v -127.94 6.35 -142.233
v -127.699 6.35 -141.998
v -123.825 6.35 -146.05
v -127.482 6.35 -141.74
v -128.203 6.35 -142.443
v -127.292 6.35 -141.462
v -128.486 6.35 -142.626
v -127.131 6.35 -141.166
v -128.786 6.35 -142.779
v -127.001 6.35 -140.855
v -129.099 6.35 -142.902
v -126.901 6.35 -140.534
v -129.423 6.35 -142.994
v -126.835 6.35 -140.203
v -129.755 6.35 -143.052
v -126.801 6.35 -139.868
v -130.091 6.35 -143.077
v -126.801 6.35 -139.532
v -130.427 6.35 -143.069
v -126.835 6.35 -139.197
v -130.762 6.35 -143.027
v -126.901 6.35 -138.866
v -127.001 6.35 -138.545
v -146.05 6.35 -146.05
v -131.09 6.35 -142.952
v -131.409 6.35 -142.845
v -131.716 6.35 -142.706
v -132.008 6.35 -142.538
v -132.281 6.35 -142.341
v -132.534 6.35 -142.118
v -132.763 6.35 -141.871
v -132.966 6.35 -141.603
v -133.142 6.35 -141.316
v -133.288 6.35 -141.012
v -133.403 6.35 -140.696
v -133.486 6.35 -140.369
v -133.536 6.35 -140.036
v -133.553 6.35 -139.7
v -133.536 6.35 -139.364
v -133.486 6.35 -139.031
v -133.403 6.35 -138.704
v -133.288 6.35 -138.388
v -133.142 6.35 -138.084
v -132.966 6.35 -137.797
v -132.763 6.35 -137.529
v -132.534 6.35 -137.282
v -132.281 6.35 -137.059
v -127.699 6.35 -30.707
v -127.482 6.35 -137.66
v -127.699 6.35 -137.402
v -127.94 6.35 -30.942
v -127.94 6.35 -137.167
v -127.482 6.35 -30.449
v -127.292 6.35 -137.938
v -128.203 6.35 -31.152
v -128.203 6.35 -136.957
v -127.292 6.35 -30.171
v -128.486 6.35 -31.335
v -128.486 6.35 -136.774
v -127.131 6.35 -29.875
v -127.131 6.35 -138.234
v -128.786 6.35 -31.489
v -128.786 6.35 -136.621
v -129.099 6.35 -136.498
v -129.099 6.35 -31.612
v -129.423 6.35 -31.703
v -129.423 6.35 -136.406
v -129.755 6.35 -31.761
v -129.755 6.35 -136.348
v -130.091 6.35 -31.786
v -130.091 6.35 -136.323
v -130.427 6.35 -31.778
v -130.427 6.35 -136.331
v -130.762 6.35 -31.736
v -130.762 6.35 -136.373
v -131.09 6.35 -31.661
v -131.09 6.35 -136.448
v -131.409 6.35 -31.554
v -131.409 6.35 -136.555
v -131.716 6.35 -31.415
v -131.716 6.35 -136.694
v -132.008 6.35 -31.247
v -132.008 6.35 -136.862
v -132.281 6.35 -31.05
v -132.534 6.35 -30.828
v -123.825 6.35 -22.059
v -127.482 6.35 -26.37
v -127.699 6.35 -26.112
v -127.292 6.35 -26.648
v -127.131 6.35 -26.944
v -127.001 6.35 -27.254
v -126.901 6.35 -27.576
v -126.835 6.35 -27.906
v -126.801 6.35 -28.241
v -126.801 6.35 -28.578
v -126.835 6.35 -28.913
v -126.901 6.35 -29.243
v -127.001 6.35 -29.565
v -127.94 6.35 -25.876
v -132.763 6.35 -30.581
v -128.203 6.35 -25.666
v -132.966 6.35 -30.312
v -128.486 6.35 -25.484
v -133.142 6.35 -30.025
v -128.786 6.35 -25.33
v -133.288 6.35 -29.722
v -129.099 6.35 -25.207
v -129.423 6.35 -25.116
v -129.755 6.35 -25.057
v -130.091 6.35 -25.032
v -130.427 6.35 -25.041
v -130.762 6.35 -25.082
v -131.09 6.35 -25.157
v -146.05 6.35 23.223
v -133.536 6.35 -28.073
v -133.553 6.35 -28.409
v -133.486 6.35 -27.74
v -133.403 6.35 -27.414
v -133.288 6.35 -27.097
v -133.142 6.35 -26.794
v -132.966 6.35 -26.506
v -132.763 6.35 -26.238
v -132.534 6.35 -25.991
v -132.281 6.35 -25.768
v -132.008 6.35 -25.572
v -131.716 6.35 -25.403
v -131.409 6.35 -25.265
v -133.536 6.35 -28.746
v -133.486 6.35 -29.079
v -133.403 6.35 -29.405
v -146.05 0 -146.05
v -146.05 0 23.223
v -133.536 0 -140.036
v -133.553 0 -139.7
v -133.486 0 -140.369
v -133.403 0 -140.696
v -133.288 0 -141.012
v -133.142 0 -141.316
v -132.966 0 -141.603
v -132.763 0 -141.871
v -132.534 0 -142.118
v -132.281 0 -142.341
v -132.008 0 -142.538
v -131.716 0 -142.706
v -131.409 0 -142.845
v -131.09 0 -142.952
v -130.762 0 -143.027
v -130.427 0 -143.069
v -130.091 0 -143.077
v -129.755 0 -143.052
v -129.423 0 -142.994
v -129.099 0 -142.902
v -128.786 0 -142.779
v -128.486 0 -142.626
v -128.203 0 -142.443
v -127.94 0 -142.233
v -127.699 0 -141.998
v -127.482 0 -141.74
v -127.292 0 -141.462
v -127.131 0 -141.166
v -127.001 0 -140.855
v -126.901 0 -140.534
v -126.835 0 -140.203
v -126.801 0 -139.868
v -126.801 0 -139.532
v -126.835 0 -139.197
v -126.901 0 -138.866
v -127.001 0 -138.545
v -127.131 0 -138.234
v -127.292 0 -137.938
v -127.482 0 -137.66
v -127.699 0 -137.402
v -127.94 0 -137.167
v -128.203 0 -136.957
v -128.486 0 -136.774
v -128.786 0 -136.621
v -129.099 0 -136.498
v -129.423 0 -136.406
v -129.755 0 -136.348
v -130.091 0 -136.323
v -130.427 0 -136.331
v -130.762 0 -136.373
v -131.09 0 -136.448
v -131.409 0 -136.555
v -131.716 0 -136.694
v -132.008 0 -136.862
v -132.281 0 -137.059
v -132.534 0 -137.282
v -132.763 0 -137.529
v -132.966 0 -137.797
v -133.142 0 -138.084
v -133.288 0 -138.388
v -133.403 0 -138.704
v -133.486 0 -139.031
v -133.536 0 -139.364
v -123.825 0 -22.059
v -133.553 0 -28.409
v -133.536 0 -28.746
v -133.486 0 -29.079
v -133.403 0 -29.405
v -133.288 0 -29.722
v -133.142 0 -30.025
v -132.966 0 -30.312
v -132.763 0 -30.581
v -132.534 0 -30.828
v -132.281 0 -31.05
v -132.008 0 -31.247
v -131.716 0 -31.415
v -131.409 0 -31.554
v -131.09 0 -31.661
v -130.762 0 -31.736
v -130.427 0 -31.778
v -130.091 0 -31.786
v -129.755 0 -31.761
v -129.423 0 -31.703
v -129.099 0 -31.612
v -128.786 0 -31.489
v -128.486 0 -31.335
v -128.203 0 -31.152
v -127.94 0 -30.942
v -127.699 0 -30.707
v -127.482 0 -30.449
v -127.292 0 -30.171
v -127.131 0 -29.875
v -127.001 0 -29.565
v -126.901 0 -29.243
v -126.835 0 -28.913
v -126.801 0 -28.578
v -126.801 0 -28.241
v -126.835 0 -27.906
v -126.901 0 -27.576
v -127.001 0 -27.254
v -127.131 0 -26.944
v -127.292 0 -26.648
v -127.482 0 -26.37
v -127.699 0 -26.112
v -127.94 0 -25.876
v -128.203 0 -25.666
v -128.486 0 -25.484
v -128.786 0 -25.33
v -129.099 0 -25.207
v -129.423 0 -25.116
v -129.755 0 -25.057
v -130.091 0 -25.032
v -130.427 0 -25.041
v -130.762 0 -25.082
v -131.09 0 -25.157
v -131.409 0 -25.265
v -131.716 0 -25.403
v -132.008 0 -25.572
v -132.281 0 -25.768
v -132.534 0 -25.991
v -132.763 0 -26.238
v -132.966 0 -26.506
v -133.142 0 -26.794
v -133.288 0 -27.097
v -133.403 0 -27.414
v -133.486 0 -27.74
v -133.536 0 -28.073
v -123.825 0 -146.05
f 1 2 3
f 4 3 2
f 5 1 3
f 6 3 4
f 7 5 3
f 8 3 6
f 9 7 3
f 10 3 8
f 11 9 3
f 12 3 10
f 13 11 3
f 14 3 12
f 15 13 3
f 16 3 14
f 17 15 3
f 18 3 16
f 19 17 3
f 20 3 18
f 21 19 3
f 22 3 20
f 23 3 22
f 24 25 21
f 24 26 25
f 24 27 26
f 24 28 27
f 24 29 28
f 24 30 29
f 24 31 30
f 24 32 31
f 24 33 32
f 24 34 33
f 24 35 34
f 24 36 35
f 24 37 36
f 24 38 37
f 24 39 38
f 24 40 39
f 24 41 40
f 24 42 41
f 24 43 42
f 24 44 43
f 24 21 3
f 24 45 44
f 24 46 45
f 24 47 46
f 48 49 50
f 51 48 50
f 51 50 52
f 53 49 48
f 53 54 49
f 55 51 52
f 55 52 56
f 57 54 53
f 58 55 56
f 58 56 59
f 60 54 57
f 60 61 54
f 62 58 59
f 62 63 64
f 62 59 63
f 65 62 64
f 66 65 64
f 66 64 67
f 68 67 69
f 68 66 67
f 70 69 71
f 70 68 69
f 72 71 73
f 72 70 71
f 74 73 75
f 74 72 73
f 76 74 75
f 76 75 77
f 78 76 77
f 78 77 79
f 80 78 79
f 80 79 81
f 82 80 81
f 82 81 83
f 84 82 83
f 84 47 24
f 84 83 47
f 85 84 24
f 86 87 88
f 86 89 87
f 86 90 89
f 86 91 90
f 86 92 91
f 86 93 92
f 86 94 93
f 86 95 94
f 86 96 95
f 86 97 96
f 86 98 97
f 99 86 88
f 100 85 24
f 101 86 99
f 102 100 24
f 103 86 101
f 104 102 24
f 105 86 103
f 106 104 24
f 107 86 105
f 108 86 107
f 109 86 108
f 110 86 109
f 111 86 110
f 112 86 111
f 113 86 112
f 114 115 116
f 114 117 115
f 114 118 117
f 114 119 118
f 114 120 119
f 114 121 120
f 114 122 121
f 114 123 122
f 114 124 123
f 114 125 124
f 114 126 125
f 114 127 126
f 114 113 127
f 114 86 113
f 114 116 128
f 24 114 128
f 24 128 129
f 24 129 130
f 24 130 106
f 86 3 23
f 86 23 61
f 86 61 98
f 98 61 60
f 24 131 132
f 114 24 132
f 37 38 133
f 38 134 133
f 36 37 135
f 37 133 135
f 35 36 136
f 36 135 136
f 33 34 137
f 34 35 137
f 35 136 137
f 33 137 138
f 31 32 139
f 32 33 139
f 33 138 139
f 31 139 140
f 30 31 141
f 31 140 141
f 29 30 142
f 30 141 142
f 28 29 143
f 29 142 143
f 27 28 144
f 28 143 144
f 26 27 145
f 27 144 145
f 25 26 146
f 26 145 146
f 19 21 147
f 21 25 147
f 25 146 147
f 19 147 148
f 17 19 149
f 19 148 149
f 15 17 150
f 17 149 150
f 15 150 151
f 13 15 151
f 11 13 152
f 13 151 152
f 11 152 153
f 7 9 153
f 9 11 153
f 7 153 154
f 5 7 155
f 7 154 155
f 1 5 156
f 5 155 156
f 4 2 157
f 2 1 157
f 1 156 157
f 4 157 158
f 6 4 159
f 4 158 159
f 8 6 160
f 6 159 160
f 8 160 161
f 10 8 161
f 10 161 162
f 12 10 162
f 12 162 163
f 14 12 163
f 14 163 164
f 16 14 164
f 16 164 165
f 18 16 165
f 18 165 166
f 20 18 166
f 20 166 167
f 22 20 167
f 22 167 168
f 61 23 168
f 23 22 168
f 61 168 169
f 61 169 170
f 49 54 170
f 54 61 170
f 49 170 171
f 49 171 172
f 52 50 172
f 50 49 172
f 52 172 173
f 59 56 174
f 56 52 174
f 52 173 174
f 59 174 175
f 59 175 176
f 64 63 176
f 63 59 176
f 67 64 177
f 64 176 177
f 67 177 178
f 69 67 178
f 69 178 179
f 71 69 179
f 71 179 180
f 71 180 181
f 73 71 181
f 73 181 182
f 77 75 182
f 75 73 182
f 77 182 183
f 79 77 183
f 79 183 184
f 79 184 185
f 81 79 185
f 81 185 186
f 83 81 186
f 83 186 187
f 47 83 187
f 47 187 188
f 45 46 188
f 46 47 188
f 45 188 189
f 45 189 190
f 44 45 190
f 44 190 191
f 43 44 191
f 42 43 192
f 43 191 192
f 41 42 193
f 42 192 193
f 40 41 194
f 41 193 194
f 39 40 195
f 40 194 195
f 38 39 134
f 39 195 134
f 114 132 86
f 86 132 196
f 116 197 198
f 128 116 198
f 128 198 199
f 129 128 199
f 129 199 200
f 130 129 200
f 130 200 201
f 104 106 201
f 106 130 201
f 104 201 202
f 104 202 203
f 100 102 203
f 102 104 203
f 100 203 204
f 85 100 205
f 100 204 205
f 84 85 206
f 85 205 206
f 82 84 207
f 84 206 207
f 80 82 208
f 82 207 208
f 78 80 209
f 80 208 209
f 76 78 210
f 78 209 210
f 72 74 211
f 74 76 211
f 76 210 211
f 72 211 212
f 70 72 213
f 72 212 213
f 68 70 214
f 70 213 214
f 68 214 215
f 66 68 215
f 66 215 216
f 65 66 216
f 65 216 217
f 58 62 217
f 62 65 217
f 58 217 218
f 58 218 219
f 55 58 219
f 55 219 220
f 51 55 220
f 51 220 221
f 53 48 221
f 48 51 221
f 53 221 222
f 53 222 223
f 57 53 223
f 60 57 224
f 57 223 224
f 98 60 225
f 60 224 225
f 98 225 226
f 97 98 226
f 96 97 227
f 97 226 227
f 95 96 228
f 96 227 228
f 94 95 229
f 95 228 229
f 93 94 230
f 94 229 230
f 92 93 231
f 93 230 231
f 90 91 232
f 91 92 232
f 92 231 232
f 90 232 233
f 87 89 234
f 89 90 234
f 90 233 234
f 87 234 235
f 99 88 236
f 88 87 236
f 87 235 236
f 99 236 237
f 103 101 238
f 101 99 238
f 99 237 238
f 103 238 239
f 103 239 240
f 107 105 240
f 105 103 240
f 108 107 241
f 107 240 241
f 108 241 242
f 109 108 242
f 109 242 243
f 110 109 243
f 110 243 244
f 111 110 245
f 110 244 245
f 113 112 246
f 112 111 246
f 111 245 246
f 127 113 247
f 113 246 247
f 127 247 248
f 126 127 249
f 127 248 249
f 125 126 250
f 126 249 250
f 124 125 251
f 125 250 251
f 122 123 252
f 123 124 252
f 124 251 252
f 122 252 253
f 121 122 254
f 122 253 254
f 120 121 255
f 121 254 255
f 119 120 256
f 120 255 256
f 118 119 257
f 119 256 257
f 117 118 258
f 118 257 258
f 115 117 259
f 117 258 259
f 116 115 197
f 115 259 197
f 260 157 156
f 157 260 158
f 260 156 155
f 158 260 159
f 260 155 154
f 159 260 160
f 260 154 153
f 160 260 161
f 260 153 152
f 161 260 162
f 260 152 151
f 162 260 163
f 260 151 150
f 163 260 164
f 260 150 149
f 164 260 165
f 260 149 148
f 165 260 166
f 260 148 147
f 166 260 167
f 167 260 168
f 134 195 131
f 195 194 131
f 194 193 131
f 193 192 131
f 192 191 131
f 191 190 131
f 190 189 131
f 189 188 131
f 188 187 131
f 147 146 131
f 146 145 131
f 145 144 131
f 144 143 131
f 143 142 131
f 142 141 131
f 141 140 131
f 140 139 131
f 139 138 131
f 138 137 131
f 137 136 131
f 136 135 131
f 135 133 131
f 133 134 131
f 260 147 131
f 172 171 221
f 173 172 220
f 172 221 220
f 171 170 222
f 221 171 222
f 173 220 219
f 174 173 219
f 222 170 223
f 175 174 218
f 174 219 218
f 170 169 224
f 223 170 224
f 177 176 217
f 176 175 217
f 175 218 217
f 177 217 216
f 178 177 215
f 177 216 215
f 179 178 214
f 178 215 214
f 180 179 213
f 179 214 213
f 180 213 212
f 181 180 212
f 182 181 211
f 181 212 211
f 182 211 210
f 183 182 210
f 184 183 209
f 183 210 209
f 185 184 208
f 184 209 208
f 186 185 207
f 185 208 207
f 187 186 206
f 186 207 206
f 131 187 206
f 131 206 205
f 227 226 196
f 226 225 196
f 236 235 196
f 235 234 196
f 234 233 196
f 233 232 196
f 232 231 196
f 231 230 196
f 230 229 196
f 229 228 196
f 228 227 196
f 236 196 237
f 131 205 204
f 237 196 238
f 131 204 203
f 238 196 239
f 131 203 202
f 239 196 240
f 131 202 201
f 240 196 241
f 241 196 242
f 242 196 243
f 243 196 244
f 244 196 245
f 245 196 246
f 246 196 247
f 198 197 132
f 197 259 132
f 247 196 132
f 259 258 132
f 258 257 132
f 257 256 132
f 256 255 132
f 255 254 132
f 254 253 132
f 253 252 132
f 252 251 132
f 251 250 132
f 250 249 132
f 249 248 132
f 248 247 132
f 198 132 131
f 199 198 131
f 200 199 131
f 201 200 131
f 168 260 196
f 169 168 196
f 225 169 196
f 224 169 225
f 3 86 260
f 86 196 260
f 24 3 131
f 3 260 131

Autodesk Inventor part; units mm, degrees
ref_plane "YZ Plane" through (0, 0, 0) normal (1, 0, 0) x (0, 1, 0)
ref_plane "XZ Plane" through (0, 0, 0) normal (0, 1, 0) x (-1, 0, 0)
ref_plane "XY Plane" through (0, 0, 0) normal (0, 0, 1) x (1, 0, 0)
sketch "Sketch1" plane through (0, 0, 0) normal (0, 1, 0) x (-1, 0, 0)
  circle A0 centre (130.175, -139.7) radius 3.3782
  circle A1 centre (130.175, -28.4093) radius 3.3782
  line L0 (146.05, 23.2231) -> (123.825, -22.0593)
  line L1 (123.825, -22.0593) -> (123.825, -146.05)
  line L2 (123.825, -146.05) -> (146.05, -146.05)
  line L3 (146.05, -146.05) -> (146.05, 23.2231)
  point P0 (0, 0)
  point P1 (0, 0)
  dimension "d0" = 22.225
extrude "Extrusion1" add sketch "Sketch1" along normal blind 6.35
properties part number "Spacer"
